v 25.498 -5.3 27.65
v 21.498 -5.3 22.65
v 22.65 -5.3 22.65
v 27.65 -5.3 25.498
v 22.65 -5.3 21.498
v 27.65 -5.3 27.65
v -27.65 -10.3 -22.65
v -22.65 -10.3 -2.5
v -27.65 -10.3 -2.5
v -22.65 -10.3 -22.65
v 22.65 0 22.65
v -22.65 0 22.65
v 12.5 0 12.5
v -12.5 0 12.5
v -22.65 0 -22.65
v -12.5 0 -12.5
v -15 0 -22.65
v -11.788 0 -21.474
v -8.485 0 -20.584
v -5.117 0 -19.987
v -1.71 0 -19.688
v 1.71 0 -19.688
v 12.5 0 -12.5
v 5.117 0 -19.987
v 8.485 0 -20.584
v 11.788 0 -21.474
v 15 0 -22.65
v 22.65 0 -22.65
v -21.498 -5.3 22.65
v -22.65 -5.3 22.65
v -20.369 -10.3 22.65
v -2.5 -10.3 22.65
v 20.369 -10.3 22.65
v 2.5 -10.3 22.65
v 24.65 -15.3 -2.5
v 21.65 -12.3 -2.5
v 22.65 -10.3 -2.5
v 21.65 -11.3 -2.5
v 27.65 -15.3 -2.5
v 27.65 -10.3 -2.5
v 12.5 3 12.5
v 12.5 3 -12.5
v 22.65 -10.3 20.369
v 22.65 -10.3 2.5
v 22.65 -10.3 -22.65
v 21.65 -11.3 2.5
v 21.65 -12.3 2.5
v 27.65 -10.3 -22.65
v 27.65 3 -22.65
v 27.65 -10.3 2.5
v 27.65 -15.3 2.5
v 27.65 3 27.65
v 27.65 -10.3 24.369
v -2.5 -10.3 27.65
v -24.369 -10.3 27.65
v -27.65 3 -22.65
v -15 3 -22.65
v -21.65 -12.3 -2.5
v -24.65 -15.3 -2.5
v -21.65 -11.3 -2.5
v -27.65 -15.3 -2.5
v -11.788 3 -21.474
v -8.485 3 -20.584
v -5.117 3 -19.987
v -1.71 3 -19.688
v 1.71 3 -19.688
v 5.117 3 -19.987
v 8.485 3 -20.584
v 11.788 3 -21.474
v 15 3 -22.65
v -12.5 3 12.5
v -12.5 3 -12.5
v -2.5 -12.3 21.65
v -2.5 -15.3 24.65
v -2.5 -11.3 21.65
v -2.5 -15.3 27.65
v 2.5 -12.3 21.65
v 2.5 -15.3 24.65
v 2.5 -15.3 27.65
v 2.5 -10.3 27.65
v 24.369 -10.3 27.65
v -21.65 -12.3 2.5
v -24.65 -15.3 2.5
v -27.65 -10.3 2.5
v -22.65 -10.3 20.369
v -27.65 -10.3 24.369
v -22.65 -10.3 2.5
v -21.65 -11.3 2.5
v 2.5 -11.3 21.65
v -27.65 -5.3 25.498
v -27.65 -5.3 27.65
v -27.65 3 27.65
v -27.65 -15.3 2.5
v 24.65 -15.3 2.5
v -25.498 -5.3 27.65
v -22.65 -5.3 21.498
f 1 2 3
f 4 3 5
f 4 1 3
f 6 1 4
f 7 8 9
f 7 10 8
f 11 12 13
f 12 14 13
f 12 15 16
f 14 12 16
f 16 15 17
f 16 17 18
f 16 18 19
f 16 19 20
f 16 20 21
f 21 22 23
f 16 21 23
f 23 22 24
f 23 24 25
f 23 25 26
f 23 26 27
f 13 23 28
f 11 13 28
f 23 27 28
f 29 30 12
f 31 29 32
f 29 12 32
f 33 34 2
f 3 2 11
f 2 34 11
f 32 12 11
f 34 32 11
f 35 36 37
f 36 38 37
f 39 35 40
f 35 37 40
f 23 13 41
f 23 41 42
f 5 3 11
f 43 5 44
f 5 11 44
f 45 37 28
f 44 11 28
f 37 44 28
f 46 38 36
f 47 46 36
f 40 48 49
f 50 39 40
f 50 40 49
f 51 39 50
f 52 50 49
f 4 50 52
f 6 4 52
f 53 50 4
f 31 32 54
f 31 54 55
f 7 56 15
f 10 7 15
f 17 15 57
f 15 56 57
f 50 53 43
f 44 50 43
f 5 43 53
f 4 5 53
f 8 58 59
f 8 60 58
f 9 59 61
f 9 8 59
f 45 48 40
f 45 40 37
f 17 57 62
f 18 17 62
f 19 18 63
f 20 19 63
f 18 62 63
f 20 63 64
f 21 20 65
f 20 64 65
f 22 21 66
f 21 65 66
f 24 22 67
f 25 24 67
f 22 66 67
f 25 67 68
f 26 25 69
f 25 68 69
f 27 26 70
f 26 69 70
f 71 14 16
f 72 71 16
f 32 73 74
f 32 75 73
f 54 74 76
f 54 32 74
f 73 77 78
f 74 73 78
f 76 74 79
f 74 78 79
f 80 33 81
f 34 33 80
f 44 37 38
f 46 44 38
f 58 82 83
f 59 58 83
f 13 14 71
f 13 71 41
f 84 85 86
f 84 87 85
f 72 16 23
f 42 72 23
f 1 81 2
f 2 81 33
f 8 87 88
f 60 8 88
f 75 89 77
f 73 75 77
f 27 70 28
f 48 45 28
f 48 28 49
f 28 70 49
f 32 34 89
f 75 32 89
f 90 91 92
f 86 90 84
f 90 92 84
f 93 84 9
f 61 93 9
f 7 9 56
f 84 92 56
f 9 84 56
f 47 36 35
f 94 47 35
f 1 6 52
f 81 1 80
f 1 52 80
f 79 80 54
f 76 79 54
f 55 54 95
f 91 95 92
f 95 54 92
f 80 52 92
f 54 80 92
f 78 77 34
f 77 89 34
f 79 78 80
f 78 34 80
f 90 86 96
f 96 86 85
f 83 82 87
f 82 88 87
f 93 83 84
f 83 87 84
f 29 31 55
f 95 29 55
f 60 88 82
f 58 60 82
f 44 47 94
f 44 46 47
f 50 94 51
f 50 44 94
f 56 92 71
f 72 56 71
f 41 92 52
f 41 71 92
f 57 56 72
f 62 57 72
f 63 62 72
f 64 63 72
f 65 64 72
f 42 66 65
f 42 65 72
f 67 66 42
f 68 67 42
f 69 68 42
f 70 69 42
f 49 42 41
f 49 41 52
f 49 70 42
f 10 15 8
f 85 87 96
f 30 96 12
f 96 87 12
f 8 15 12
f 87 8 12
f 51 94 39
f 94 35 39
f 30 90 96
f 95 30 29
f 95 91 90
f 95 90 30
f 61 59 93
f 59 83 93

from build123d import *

# Parameters (mm, degrees)
SKETCH1_W                    = 45.3
SKETCH1_H                    = 45.3
SKETCH1_W_2                  = 25
SKETCH1_H_2                  = 25
BOSS_EXTRUDE1_DEPTH          = 3
BOSS_EXTRUDE2_DEPTH          = 10.3
BOSS_EXTRUDE3_DEPTH          = 2.5
CIRPATTERN1_COUNT            = 3
CIRPATTERN1_ANGLE            = 180
CUT_EXTRUDE1_DEPTH           = 5
CUT_EXTRUDE1_DRAFT           = -10
CUT_EXTRUDE1_PROFILE_2_DEPTH = 5
CUT_EXTRUDE1_PROFILE_2_DRAFT = -10
CUT_EXTRUDE2_REACH           = 45.173


with BuildPart() as part:
    # Sketch1 → Boss-Extrude1 (new body)
    # profile 1 of 2: a face of its own
    with BuildSketch(Plane(origin=(0, 0, 0), x_dir=(1, 0, 0), z_dir=(0, 1, 0))):
        Polygon((-27.65, 22.65), (-22.65, 22.65), (-22.65, -22.65), (22.65, -22.65), (22.65, 22.65), (27.65, 22.65), (27.65, -27.65), (-27.65, -27.65), align=None)
    # profile 2 of 2: a face of its own
    with BuildSketch(Plane(origin=(0, 0, 0), x_dir=(1, 0, 0), z_dir=(0, 1, 0))):
        Rectangle(SKETCH1_W, SKETCH1_H)
        Rectangle(SKETCH1_W_2, SKETCH1_H_2, mode=Mode.SUBTRACT)
    extrude(amount=BOSS_EXTRUDE1_DEPTH)

    # Sketch1<3> → Boss-Extrude2 (add)
    with BuildSketch(Plane(origin=(0, 0, 0), x_dir=(1, 0, 0), z_dir=(0, 1, 0))):
        Polygon((-27.65, 22.65), (-22.65, 22.65), (-22.65, -22.65), (22.65, -22.65), (22.65, 22.65), (27.65, 22.65), (27.65, -27.65), (-27.65, -27.65), align=None)
    extrude(amount=-BOSS_EXTRUDE2_DEPTH)

    # Sketch2 → Boss-Extrude3 (add, symmetric)
    with BuildSketch(Plane(origin=(0, 0, 0), x_dir=(-1, 0, 0), z_dir=(0, 0, -1))):
        Polygon((-21.65, -12.3), (-24.65, -15.3), (-27.65, -15.3), (-27.65, -10.3), (-22.65, -10.3), (-21.65, -11.3), align=None)
    boss_extrude3 = extrude(amount=BOSS_EXTRUDE3_DEPTH, both=True)

    # CirPattern1: Boss-Extrude3 ×3 about axis
    cirpattern1_axis = Axis((0, 0, 0), (0, -1, 0))
    for i in range(1, CIRPATTERN1_COUNT):
        add(boss_extrude3.rotate(cirpattern1_axis, i * CIRPATTERN1_ANGLE / (CIRPATTERN1_COUNT - 1)))


with BuildPart() as cut_extrude1_tool:
    # Sketch3 → Cut-Extrude1 (with draft: the straight prism first)
    with BuildSketch(Plane.XZ.offset(10.3)):
        Polygon((21.65, 21.65), (21.65, 19.569375153), (28.65, 25.169375153), (28.65, 28.65), (25.169375153, 28.65), (19.569375153, 21.65), align=None)
    extrude(amount=-CUT_EXTRUDE1_DEPTH)
    # Cut-Extrude1: the draft: its side faces are tilted about the plane it starts from
    cut_extrude1_sides = [cut_extrude1_tool.faces().sort_by_distance(p)[0] for p in [
        (21.65, -7.8, 20.609687576),
        (25.15, -7.8, 22.369375153),
        (28.65, -7.8, 26.909687576),
        (26.909687576, -7.8, 28.65),
        (22.369375153, -7.8, 25.15),
        (20.609687576, -7.8, 21.65),
    ]]
    draft(cut_extrude1_sides, Plane.XZ.offset(10.3), CUT_EXTRUDE1_DRAFT)


with BuildPart() as part_1:
    add(part.part)

    # Cut-Extrude1: cut by cut_extrude1_tool
    add(cut_extrude1_tool.part, mode=Mode.SUBTRACT)


with BuildPart() as cut_extrude1_profile_2_tool:
    # Sketch3 → Cut-Extrude1 profile 2 (with draft: the straight prism first)
    with BuildSketch(Plane.XZ.offset(10.3)):
        Polygon((-21.65, 19.569375153), (-21.65, 21.65), (-19.569375153, 21.65), (-25.169375153, 28.65), (-28.65, 28.65), (-28.65, 25.169375153), align=None)
    extrude(amount=-CUT_EXTRUDE1_PROFILE_2_DEPTH)
    # Cut-Extrude1 profile 2: the draft: its side faces are tilted about the plane it starts from
    cut_extrude1_profile_2_sides = [cut_extrude1_profile_2_tool.faces().sort_by_distance(p)[0] for p in [
        (-21.65, -7.8, 20.609687576),
        (-20.609687576, -7.8, 21.65),
        (-22.369375153, -7.8, 25.15),
        (-26.909687576, -7.8, 28.65),
        (-28.65, -7.8, 26.909687576),
        (-25.15, -7.8, 22.369375153),
    ]]
    draft(cut_extrude1_profile_2_sides, Plane.XZ.offset(10.3), CUT_EXTRUDE1_PROFILE_2_DRAFT)


with BuildPart() as part_2:
    add(part_1.part)

    # Cut-Extrude1 profile 2: cut by cut_extrude1_profile_2_tool
    add(cut_extrude1_profile_2_tool.part, mode=Mode.SUBTRACT)

    # Sketch5 → Cut-Extrude2 (cut, up to next)
    with BuildSketch(Plane(origin=(0, 3, 0), x_dir=(1, 0, 0), z_dir=(0, 1, 0)), mode=Mode.PRIVATE) as cut_extrude2_sk1:
        with BuildLine():
            Line((15, 22.65), (-15, 22.65))
            ThreePointArc((-15, 22.65), (0, 19.65), (15, 22.65))
        make_face()
    cut_extrude2_tool1 = extrude(cut_extrude2_sk1.sketch, amount=-CUT_EXTRUDE2_REACH, mode=Mode.PRIVATE) & part_2.part
    add(cut_extrude2_tool1.solids().sort_by_distance((0, 3, -21.445954))[0], mode=Mode.SUBTRACT)


solid = part_2.part
